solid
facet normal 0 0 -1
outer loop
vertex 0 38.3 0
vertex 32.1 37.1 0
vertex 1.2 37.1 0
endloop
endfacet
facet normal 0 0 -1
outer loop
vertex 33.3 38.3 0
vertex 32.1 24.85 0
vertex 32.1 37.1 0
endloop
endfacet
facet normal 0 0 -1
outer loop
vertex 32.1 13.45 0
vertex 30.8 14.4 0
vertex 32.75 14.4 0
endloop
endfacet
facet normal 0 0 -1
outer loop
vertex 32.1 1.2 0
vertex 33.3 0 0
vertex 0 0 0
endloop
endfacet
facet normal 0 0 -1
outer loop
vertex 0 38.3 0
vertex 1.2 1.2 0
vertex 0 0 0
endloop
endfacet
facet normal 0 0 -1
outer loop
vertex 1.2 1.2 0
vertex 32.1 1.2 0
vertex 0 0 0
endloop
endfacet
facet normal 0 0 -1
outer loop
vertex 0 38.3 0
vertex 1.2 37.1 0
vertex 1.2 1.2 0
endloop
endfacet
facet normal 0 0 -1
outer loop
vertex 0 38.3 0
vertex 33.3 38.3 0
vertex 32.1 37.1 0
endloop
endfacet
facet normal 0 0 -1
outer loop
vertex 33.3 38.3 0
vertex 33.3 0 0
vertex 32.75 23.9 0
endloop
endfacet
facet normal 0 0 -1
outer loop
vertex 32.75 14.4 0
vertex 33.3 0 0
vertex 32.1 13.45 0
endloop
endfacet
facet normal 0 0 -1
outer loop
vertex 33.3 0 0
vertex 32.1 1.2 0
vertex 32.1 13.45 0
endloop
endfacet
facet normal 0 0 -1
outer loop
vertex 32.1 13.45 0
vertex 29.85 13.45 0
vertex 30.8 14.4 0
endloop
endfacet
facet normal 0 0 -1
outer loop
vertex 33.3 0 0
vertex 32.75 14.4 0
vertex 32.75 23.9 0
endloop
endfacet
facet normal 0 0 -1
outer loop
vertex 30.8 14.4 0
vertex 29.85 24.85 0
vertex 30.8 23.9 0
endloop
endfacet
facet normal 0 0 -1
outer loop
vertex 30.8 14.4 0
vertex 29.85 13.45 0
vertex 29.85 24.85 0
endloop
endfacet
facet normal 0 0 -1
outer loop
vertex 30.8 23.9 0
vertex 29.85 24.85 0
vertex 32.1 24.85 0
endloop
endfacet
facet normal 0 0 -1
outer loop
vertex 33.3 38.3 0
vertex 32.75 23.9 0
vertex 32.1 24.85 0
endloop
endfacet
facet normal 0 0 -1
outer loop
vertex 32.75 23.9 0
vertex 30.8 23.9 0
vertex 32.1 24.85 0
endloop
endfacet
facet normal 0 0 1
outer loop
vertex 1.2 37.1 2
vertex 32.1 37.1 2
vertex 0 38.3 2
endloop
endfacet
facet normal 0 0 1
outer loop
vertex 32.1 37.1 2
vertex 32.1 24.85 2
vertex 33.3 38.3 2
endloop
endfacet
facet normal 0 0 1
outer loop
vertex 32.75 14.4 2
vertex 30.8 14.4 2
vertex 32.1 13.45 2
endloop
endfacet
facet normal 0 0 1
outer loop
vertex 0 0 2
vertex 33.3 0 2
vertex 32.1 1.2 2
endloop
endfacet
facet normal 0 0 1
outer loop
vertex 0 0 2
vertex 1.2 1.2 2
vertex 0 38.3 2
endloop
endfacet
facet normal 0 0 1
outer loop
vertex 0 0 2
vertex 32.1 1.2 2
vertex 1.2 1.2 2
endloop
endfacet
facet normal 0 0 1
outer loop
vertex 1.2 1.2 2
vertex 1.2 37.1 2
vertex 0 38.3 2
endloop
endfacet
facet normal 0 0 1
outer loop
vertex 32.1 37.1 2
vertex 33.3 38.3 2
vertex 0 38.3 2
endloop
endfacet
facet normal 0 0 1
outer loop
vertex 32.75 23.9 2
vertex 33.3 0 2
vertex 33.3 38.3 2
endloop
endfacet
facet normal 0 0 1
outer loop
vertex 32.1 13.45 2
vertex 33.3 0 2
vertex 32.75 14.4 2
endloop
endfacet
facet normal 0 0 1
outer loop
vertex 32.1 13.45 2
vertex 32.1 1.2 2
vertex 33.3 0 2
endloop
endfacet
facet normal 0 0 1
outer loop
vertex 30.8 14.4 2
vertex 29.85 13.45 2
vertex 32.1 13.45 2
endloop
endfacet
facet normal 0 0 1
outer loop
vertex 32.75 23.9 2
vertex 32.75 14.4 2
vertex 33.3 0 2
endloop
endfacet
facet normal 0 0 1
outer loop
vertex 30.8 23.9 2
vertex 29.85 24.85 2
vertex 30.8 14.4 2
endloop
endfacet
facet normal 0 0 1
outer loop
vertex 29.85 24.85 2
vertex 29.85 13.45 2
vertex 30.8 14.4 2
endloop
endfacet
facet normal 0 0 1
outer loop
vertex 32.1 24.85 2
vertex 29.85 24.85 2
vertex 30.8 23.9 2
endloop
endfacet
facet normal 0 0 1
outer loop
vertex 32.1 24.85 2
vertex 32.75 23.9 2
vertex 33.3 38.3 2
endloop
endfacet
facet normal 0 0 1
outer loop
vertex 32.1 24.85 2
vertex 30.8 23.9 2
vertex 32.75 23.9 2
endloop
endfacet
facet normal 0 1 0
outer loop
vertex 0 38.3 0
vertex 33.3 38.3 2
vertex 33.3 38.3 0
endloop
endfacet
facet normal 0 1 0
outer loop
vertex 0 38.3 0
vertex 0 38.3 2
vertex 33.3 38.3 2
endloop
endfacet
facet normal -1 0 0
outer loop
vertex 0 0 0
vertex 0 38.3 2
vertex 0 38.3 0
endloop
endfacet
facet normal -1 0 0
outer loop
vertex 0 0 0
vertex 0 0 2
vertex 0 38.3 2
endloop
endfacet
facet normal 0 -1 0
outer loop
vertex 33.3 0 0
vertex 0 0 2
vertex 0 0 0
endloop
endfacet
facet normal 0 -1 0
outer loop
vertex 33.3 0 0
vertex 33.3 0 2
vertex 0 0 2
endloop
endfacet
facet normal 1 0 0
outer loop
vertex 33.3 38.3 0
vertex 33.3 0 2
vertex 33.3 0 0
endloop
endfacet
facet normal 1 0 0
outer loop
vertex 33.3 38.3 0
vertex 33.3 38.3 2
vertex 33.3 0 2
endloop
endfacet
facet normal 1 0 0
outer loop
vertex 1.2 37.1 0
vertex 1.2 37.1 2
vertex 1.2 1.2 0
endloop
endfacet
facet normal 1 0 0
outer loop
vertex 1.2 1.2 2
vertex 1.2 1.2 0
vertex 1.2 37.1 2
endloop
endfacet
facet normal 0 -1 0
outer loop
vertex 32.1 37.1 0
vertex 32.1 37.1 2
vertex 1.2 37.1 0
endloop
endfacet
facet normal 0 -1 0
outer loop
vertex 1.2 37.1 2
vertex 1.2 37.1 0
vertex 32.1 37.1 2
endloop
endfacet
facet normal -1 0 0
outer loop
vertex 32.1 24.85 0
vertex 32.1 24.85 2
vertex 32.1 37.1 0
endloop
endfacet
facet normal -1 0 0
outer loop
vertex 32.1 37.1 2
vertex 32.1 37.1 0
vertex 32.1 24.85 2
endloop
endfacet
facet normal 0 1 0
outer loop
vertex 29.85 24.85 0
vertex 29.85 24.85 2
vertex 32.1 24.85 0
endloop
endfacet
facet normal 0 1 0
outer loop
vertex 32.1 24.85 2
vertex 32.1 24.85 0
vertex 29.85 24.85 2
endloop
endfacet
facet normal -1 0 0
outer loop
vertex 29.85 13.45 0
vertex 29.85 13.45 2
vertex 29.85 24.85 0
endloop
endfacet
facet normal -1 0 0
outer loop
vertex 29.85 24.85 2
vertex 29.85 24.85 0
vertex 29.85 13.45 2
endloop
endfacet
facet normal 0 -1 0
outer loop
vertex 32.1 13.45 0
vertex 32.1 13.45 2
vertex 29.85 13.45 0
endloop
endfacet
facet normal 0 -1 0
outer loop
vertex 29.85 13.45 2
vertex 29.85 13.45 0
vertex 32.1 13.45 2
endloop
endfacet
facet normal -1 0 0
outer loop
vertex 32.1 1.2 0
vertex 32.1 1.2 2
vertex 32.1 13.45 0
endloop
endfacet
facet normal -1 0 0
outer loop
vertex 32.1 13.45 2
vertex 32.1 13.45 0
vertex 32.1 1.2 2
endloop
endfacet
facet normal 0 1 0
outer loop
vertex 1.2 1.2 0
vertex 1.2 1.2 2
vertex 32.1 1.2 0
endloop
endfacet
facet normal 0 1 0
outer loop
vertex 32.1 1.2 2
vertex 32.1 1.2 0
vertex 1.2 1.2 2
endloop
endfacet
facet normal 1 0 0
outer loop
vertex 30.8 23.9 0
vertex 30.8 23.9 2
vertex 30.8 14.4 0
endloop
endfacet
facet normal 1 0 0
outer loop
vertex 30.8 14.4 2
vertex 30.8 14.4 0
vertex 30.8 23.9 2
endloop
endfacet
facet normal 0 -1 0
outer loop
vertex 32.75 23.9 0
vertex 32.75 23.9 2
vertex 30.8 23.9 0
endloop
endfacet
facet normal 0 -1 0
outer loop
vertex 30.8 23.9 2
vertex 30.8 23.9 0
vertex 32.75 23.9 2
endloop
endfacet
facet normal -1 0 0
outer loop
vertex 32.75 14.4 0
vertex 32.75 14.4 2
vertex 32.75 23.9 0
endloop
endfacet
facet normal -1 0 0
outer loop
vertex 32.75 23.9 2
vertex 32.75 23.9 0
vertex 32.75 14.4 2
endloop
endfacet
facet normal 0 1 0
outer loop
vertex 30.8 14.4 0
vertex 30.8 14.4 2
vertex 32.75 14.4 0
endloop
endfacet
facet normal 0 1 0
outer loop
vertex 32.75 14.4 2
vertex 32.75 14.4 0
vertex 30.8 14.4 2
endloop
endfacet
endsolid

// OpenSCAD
// file: measurements/display.scad
/**
 * The distance between the left and right edges of the display's casing, in millimeters.
 */
display_width = 33.3;

/**
 * The distance between the top and bottom edges of the display's casing, in millimeters.
 */
display_height = 38.3;

/**
 * The distance between the (visible) front and (PCB-facing) back faces of the display's casing, ignoring the connector, in millimeters.
 */
display_thickness = 2;

/**
 * The distance between the left edge of the display's casing and the left edge of its viewable area, in millimeters.
 */
display_left_padding = 3.5;

/**
 * The distance between the right edge of the display's casing and the right edge of its viewable area, in millimeters.
 */
display_right_padding = 8.3;

/**
 * The distance between the top edge of the display's casing and the left top of its viewable area, in millimeters.
 */
display_top_padding = 4;

/**
 * The distance between the left edge of the display's casing and the bottom edge of its viewable area, in millimeters.
 */
display_bottom_padding = 4;

/**
 * The sizes of the radiuses of the corners of the shell's display cutout, in millimeters.
 */
display_radius_size = 2;

/**
 * The number of sides of each corner radius of the shell's display cutout.
 */
display_radius_sides = 16;

/**
 * The amount of margin on each side of the display's visible area, in millimeters; effectively expands the display by this amount in each direction.
 */
display_cutout_margin = 1;

/**
 * The amount of tolerance between each side of the display's casing and the retaining wall, in millimeters.
 */
display_xy_tolerance = 0.25;

/**
 * The thickness of the display retaining wall, in millimeters.
 */
display_wall_thickness = 0.6;

/**
 * The distance between the display's casing (ignoring the connector) and the PCB, in millimeters.
 */
display_pcb_distance = 2;

/**
 * The distance between the left edge of the display's casing and the left edge of the PCB, in millimeters.
 */
display_pcb_left = 0.8;

/**
 * The distance between the bottom edge of the display's casing and the bottom edge of the PCB, in millimeters.
 */
display_pcb_bottom = 0.8;

/**
 * The thickness of the front bezel, in millimeters.
 */
display_bezel_thickness = 1.4;

/**
 * The height of the display's connector.
 */
display_connector_height = 9;

/**
 * The width of the display's connector.
 */
display_connector_width = 1.45;

/**
 * The tolerance around the display's connector.
 */
display_connector_tolerance = 0.25;

/**
 * The distance between the right edge of the display and its connector.
 */
display_right_connector_right = 0.8;

/**
 * The distance between the bottom edge of the display and its connector.
 */
display_bottom_connector_bottom = 14.65;

/**
 * The thickness of the display's spacer.
 */
display_spacer_thickness = 1.2;
// main file
include <measurements/display.scad>;

linear_extrude(display_pcb_distance) {
  difference() {
    union() {
      difference() {
        square([display_width, display_height]);

        translate([
          display_spacer_thickness,
          display_spacer_thickness,
        ]) {
          square([
            display_width - display_spacer_thickness * 2,
            display_height - display_spacer_thickness * 2,
          ]);
        };
      };

      translate([
        display_width - display_right_connector_right - display_connector_width - display_spacer_thickness,
        display_bottom_connector_bottom - display_spacer_thickness,
      ]) {
        square([
          display_spacer_thickness + display_connector_width + display_right_connector_right,
          display_spacer_thickness * 2 + display_connector_height,
        ]);
      };
    };

    translate([
      display_width - display_right_connector_right - display_connector_width - display_connector_tolerance,
      display_bottom_connector_bottom - display_connector_tolerance,
    ]) {
      square([
        display_connector_width + display_connector_tolerance * 2,
        display_connector_height + display_connector_tolerance * 2,
      ]);
    };
  };
};
